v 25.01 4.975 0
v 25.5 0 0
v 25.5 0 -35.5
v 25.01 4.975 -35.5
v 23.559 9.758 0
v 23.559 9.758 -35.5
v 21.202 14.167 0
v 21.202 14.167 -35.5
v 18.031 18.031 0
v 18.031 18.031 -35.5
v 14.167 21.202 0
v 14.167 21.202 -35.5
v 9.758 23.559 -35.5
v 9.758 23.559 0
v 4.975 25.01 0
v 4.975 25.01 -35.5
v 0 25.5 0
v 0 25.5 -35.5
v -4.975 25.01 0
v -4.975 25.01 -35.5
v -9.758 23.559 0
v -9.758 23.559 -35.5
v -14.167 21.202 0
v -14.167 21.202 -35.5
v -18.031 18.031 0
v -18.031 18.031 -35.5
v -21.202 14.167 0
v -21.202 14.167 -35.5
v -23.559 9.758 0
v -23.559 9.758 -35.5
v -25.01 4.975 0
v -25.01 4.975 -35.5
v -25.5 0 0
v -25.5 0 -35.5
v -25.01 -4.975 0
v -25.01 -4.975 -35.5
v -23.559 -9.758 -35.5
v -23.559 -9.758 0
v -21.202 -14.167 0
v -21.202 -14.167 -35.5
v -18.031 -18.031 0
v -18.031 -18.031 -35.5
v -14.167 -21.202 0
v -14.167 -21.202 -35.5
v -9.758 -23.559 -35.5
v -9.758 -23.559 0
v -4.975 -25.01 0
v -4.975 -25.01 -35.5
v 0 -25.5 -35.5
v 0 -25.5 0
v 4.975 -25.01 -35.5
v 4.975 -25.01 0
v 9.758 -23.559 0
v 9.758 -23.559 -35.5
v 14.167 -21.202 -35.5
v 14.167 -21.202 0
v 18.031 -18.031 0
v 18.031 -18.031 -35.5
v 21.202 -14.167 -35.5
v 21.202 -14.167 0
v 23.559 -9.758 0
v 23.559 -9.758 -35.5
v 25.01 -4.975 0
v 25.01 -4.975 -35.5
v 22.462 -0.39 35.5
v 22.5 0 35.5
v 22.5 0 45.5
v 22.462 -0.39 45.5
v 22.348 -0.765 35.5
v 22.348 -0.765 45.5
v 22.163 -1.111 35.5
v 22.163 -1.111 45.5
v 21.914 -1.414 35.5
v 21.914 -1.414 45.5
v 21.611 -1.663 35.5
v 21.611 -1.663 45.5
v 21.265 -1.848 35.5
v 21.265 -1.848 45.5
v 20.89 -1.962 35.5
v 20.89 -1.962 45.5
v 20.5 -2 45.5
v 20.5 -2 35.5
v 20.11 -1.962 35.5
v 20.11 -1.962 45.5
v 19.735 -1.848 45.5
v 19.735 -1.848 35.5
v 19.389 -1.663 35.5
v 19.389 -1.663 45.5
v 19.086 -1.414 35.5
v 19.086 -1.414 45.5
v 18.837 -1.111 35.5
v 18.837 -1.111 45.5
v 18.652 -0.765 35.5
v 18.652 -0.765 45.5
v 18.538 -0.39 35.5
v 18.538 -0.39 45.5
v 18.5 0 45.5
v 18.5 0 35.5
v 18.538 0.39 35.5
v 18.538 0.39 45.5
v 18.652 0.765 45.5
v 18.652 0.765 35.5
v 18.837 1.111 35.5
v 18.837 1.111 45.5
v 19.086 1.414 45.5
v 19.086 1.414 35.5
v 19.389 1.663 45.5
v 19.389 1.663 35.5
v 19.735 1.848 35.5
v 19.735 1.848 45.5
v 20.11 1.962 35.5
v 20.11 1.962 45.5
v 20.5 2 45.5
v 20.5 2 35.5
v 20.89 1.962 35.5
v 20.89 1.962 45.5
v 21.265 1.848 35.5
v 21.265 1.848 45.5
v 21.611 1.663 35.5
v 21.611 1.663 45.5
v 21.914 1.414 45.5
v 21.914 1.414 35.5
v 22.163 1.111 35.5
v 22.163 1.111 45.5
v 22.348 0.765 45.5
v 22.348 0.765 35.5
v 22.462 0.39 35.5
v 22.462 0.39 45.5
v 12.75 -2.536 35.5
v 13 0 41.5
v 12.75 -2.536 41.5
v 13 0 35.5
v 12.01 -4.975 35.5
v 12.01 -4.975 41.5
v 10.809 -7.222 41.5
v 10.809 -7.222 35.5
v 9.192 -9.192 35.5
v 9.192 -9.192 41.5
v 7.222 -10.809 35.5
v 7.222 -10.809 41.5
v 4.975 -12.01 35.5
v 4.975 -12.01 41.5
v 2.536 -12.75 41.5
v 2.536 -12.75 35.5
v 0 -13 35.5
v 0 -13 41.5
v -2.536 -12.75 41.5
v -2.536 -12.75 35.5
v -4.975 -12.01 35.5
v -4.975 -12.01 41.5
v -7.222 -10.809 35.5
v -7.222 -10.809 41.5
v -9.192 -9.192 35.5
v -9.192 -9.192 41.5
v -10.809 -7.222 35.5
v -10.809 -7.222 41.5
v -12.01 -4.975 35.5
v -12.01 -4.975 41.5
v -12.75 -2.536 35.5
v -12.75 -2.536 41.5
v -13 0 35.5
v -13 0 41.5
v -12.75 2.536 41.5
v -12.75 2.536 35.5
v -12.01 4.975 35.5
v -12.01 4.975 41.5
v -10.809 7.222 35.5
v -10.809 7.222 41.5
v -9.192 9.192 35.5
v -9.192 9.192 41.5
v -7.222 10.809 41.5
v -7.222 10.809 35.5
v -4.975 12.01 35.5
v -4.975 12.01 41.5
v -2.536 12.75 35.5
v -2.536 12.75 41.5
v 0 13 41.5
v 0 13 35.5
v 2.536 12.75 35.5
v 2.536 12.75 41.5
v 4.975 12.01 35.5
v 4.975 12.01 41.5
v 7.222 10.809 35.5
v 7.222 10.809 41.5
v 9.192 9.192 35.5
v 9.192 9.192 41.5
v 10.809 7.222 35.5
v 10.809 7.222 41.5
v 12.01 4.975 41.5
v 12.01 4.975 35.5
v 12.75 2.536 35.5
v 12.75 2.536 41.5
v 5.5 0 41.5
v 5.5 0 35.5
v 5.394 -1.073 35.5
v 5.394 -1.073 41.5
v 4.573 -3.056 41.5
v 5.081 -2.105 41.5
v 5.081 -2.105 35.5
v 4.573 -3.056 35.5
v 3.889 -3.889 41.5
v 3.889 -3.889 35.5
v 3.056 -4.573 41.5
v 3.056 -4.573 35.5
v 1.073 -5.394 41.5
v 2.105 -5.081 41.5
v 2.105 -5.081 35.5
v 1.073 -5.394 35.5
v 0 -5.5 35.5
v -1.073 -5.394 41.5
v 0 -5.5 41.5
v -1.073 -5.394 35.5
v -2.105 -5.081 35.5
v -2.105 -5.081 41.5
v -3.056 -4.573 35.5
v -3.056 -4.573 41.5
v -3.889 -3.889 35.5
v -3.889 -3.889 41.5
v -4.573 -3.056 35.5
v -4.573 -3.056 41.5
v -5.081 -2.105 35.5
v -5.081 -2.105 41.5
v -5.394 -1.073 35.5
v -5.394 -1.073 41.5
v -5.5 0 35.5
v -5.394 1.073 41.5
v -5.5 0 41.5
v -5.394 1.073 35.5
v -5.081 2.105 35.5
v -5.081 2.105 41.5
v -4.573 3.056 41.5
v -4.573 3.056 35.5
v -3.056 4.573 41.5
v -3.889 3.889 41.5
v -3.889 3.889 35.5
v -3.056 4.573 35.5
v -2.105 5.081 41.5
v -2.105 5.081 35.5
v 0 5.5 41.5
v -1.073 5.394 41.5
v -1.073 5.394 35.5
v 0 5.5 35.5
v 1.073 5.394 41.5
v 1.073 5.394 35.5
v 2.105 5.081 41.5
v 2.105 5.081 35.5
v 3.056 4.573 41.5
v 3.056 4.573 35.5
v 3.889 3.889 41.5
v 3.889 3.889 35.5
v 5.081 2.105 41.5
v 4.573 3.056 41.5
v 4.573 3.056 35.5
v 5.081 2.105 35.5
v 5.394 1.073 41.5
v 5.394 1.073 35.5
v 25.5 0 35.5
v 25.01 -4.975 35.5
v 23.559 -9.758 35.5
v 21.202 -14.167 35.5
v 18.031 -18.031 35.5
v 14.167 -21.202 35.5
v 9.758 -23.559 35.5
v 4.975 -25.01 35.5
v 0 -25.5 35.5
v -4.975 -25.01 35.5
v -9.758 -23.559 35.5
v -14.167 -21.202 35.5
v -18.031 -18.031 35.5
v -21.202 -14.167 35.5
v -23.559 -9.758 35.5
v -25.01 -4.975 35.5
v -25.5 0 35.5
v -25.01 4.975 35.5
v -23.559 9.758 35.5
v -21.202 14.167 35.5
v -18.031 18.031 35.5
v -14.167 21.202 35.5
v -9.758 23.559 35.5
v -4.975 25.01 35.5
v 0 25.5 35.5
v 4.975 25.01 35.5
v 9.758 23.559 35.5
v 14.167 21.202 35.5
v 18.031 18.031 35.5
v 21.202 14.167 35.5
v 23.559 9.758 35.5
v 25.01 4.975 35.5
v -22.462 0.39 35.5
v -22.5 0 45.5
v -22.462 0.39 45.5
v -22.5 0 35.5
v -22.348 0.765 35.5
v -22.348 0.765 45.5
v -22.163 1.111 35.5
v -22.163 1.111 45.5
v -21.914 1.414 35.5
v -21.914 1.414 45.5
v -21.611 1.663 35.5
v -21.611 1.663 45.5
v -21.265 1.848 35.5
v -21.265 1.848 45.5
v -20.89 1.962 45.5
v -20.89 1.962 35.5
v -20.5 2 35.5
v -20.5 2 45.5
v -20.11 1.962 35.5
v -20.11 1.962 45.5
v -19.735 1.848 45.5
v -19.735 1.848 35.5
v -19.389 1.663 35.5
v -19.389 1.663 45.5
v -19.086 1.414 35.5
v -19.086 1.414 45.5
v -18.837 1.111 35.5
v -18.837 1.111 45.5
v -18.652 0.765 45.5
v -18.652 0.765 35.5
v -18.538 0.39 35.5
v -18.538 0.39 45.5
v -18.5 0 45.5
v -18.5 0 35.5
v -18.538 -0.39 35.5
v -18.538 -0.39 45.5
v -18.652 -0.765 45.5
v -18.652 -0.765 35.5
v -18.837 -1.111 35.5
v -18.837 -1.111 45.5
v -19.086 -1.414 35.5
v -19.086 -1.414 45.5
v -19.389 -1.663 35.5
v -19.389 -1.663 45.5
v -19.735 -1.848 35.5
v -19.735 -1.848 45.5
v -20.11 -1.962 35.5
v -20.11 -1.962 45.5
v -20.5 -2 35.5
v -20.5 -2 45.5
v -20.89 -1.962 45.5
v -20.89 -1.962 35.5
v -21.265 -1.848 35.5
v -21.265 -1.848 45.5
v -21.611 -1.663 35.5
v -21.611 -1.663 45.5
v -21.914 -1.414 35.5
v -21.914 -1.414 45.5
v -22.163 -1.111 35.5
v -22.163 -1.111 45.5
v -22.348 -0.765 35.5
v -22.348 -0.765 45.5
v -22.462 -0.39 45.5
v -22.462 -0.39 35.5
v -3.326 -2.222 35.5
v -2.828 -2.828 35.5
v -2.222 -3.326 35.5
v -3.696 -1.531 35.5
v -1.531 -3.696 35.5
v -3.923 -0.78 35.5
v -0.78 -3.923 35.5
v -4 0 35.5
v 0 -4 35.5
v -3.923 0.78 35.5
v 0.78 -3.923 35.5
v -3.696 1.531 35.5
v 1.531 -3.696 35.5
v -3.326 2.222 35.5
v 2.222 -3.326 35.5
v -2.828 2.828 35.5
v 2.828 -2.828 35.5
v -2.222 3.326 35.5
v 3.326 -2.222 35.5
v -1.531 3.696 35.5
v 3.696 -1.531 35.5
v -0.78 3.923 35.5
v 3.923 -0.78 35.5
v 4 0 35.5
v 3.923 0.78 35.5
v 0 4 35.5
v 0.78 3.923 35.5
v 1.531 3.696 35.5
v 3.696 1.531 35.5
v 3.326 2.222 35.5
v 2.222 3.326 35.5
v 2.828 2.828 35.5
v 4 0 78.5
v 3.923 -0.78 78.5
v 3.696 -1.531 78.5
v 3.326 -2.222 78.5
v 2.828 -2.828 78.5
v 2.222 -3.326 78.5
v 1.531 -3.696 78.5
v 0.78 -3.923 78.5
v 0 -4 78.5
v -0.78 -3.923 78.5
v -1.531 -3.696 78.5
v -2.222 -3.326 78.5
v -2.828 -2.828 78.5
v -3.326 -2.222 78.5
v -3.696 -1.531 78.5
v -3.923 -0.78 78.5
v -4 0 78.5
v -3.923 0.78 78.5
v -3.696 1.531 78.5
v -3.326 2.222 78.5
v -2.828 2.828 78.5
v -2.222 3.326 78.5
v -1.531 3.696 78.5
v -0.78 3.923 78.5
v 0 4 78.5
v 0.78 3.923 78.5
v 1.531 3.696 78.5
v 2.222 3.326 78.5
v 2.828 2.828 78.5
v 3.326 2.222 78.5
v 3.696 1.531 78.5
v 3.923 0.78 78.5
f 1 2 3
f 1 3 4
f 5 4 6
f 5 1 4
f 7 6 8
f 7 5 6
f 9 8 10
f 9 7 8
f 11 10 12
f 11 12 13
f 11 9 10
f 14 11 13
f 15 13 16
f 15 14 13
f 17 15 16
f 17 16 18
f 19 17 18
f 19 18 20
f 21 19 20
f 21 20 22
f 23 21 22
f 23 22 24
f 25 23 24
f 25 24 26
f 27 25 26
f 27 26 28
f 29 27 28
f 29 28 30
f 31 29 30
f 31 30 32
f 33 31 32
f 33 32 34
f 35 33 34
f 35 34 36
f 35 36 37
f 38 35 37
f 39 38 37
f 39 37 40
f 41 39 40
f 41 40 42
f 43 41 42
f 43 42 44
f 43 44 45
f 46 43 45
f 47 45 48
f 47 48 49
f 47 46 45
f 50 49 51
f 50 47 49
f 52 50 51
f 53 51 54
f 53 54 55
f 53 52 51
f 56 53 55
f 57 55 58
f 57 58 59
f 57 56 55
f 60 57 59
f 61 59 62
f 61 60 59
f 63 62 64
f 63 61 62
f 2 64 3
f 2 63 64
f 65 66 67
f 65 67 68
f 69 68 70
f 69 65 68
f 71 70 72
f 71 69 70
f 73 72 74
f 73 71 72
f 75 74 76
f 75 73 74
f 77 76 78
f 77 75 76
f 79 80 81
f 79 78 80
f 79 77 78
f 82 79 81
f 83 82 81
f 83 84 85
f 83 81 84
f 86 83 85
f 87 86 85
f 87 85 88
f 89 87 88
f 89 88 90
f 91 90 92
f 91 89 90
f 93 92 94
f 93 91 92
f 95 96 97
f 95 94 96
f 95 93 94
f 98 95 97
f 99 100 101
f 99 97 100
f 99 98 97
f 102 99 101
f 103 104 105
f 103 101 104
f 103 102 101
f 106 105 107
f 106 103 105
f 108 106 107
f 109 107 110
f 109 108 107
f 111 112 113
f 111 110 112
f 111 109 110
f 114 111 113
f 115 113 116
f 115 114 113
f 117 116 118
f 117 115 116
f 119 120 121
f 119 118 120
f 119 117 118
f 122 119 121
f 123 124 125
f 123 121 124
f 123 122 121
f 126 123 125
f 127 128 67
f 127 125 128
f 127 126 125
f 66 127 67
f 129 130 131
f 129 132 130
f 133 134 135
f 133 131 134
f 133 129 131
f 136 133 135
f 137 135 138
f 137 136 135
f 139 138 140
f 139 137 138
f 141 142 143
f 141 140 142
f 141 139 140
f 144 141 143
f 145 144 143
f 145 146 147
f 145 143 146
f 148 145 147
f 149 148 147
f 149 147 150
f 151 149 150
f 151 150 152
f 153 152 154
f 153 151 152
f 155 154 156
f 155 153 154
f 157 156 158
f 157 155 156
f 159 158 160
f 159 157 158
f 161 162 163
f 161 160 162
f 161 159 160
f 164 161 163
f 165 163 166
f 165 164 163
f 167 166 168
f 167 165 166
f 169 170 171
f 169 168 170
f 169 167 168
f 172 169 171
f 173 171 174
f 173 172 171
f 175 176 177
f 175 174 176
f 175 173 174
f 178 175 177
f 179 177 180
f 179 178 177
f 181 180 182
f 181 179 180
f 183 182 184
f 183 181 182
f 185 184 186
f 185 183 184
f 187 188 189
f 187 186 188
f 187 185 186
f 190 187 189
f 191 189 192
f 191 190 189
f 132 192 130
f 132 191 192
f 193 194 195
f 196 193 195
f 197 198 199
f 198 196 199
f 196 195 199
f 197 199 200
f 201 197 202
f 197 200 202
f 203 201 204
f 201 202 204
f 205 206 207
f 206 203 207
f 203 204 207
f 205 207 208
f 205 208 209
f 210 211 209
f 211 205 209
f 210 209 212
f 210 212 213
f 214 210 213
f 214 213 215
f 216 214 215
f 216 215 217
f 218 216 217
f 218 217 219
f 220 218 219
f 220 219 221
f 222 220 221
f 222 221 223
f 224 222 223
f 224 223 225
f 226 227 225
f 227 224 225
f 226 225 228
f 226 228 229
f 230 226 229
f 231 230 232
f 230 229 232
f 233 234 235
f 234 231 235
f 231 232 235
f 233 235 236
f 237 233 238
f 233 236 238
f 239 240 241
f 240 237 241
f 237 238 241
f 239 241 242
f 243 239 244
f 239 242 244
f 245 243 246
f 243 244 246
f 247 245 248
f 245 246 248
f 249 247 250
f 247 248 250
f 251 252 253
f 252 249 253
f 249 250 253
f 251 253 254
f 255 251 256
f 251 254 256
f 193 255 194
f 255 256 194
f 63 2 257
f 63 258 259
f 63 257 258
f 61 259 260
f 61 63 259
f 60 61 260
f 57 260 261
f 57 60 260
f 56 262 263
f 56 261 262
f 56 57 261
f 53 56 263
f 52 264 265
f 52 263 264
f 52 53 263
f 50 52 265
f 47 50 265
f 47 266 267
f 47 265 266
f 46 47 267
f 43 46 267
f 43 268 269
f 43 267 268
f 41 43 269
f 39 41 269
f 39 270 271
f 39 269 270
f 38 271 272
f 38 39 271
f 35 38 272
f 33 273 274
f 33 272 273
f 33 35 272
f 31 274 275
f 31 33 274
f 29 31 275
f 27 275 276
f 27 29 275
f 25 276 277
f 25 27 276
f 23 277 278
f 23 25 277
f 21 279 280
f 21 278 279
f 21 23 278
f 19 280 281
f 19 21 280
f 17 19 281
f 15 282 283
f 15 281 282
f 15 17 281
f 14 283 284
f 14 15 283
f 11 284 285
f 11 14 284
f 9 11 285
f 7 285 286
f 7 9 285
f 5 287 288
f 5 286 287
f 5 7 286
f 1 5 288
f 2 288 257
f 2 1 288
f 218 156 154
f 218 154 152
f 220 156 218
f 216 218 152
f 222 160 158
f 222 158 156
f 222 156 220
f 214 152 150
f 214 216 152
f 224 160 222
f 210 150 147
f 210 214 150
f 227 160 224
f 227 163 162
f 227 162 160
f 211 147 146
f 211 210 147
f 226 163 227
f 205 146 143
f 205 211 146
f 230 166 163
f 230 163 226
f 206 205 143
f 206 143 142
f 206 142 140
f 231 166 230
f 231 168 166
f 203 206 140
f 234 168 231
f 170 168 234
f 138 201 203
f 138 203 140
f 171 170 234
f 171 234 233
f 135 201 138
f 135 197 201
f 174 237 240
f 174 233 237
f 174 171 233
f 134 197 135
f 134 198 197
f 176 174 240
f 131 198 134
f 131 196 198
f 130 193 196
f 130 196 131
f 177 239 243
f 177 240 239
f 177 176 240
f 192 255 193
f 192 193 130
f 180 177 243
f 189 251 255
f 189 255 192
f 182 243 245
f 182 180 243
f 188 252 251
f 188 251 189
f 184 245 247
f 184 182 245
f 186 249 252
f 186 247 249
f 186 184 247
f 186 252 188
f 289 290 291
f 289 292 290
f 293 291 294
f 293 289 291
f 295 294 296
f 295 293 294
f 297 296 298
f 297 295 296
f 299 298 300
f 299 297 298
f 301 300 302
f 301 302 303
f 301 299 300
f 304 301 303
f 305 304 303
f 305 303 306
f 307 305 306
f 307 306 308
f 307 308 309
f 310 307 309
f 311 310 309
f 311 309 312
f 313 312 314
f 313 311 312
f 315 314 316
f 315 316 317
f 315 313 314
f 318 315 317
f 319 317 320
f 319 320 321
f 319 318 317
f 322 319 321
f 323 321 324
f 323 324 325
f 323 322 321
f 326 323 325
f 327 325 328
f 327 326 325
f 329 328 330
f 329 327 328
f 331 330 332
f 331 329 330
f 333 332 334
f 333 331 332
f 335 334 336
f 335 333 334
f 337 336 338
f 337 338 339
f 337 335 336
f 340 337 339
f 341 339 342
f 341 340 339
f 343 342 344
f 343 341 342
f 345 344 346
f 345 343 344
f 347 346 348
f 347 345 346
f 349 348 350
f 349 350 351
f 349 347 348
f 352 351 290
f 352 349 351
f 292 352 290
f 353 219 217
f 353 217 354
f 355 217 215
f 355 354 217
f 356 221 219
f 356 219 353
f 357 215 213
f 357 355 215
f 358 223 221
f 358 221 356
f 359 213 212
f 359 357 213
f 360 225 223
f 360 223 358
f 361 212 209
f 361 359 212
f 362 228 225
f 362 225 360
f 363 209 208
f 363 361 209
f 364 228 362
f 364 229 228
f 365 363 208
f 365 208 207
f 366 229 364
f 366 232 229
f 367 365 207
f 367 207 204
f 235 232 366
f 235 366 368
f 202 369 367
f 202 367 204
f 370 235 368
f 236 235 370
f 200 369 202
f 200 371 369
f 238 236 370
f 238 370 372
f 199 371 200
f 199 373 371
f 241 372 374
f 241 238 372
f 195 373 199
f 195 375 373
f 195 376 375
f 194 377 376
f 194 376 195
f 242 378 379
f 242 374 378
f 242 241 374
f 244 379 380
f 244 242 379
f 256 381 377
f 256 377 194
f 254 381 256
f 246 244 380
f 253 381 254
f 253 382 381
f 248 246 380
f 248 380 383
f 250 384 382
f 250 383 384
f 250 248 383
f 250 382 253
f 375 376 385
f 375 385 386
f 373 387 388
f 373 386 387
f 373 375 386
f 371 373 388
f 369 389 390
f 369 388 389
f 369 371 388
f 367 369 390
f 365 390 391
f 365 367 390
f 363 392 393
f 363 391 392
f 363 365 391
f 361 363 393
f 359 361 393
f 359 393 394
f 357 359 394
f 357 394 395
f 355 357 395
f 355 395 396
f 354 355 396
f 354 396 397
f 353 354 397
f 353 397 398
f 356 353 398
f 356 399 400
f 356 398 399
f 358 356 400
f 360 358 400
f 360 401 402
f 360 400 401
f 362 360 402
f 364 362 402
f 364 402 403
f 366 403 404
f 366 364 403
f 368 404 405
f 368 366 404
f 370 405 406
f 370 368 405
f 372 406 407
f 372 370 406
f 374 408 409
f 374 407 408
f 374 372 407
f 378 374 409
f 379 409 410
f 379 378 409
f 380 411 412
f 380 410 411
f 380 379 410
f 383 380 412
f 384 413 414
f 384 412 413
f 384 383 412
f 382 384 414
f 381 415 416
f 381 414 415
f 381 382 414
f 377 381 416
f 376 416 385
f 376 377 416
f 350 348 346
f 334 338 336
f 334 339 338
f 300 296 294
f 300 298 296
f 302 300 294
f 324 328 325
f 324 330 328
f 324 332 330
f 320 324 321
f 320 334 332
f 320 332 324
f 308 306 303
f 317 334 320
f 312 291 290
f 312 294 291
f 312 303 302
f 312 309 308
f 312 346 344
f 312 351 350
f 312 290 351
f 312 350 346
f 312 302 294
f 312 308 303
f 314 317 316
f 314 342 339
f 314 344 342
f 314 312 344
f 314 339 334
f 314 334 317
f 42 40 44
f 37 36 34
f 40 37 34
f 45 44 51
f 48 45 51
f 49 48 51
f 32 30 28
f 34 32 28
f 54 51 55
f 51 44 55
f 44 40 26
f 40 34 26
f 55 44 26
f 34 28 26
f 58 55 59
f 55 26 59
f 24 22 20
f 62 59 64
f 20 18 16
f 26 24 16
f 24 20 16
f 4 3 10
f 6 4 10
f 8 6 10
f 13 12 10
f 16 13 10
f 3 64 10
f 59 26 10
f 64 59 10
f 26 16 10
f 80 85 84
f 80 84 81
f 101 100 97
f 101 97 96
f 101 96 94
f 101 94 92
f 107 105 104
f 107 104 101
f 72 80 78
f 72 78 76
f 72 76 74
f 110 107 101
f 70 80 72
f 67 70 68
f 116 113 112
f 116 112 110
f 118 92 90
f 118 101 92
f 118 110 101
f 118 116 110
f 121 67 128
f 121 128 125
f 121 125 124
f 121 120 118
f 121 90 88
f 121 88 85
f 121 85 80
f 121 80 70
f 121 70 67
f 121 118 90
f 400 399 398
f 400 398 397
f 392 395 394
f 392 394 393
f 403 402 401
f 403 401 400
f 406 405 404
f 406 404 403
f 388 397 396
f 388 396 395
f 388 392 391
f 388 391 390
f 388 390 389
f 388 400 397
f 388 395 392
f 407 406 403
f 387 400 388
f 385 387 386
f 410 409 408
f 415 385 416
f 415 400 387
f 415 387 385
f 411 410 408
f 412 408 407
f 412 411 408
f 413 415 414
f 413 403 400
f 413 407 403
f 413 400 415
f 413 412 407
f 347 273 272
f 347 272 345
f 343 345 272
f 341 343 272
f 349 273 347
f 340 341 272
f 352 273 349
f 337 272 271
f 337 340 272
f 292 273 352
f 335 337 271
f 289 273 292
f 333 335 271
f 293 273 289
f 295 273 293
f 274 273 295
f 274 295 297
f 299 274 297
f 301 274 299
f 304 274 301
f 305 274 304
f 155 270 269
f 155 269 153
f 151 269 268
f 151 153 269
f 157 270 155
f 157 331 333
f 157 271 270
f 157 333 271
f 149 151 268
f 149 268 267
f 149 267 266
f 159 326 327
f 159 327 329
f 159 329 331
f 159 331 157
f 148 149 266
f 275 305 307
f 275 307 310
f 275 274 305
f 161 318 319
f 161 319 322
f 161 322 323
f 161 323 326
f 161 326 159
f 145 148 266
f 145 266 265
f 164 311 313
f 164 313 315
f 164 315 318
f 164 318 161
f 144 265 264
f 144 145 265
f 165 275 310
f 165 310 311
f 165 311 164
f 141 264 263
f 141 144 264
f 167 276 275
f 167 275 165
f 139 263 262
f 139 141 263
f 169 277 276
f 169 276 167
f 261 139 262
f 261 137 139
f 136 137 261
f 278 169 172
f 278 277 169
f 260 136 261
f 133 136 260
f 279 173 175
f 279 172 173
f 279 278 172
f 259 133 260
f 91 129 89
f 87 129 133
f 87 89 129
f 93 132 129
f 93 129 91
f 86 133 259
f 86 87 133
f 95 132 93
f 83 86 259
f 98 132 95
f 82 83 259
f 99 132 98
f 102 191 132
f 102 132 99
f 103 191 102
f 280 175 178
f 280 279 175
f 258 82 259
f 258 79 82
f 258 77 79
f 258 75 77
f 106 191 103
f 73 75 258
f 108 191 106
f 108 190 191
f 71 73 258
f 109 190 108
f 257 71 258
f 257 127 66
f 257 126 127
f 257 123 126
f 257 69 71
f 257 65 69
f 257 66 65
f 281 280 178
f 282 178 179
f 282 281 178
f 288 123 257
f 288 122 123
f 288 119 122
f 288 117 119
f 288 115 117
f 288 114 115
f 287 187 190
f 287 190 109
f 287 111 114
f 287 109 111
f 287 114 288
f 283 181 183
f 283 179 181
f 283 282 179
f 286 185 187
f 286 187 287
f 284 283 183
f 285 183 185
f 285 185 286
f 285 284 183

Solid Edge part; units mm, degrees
sketch "Sketch1" plane through (0, 0, 0) normal (0, 0, 1) x (1, 0, 0)
  circle A0 centre (0, 0) radius 25.5
  dimension "D1" = 51
extrude "Ajout_matière_1" add sketch "Sketch1" along normal mid plane 71
sketch "Sketch2" plane through (0, 0, 35.5) normal (0, 0, 1) x (1, 0, 0)
  circle A0 centre (0, 0) radius 13
  circle A1 centre (0, 0) radius 5.5
  dimension "D1" = 26
  dimension "D2" = 11
extrude "Ajout_matière_2" add sketch "Sketch2" along normal blind 6
sketch "Sketch3" plane through (0, 0, 35.5) normal (0, 0, 1) x (1, 0, 0)
  circle A0 centre (20.5, 0) radius 2
  dimension "D1" = 4
  dimension "D2" = 20.5
extrude "Ajout_matière_3" add sketch "Sketch3" along normal blind 10
mirror "Mirror1" about plane through (0, 0, 0) normal (1, 0, 0) of "Ajout_matière_3"
sketch "Sketch4" plane through (0, 0, 35.5) normal (0, 0, 1) x (1, 0, 0)
  circle A0 centre (0, 0) radius 4
  dimension "D1" = 8
extrude "Ajout_matière_5" add sketch "Sketch4" along normal blind 43
cosmetic_thread "Filetage_1" size "M8" thread depth 13
cosmetic_thread "Thread1" size "M4"
cosmetic_thread "Thread2" size "M4"
properties material "Acier S235"
